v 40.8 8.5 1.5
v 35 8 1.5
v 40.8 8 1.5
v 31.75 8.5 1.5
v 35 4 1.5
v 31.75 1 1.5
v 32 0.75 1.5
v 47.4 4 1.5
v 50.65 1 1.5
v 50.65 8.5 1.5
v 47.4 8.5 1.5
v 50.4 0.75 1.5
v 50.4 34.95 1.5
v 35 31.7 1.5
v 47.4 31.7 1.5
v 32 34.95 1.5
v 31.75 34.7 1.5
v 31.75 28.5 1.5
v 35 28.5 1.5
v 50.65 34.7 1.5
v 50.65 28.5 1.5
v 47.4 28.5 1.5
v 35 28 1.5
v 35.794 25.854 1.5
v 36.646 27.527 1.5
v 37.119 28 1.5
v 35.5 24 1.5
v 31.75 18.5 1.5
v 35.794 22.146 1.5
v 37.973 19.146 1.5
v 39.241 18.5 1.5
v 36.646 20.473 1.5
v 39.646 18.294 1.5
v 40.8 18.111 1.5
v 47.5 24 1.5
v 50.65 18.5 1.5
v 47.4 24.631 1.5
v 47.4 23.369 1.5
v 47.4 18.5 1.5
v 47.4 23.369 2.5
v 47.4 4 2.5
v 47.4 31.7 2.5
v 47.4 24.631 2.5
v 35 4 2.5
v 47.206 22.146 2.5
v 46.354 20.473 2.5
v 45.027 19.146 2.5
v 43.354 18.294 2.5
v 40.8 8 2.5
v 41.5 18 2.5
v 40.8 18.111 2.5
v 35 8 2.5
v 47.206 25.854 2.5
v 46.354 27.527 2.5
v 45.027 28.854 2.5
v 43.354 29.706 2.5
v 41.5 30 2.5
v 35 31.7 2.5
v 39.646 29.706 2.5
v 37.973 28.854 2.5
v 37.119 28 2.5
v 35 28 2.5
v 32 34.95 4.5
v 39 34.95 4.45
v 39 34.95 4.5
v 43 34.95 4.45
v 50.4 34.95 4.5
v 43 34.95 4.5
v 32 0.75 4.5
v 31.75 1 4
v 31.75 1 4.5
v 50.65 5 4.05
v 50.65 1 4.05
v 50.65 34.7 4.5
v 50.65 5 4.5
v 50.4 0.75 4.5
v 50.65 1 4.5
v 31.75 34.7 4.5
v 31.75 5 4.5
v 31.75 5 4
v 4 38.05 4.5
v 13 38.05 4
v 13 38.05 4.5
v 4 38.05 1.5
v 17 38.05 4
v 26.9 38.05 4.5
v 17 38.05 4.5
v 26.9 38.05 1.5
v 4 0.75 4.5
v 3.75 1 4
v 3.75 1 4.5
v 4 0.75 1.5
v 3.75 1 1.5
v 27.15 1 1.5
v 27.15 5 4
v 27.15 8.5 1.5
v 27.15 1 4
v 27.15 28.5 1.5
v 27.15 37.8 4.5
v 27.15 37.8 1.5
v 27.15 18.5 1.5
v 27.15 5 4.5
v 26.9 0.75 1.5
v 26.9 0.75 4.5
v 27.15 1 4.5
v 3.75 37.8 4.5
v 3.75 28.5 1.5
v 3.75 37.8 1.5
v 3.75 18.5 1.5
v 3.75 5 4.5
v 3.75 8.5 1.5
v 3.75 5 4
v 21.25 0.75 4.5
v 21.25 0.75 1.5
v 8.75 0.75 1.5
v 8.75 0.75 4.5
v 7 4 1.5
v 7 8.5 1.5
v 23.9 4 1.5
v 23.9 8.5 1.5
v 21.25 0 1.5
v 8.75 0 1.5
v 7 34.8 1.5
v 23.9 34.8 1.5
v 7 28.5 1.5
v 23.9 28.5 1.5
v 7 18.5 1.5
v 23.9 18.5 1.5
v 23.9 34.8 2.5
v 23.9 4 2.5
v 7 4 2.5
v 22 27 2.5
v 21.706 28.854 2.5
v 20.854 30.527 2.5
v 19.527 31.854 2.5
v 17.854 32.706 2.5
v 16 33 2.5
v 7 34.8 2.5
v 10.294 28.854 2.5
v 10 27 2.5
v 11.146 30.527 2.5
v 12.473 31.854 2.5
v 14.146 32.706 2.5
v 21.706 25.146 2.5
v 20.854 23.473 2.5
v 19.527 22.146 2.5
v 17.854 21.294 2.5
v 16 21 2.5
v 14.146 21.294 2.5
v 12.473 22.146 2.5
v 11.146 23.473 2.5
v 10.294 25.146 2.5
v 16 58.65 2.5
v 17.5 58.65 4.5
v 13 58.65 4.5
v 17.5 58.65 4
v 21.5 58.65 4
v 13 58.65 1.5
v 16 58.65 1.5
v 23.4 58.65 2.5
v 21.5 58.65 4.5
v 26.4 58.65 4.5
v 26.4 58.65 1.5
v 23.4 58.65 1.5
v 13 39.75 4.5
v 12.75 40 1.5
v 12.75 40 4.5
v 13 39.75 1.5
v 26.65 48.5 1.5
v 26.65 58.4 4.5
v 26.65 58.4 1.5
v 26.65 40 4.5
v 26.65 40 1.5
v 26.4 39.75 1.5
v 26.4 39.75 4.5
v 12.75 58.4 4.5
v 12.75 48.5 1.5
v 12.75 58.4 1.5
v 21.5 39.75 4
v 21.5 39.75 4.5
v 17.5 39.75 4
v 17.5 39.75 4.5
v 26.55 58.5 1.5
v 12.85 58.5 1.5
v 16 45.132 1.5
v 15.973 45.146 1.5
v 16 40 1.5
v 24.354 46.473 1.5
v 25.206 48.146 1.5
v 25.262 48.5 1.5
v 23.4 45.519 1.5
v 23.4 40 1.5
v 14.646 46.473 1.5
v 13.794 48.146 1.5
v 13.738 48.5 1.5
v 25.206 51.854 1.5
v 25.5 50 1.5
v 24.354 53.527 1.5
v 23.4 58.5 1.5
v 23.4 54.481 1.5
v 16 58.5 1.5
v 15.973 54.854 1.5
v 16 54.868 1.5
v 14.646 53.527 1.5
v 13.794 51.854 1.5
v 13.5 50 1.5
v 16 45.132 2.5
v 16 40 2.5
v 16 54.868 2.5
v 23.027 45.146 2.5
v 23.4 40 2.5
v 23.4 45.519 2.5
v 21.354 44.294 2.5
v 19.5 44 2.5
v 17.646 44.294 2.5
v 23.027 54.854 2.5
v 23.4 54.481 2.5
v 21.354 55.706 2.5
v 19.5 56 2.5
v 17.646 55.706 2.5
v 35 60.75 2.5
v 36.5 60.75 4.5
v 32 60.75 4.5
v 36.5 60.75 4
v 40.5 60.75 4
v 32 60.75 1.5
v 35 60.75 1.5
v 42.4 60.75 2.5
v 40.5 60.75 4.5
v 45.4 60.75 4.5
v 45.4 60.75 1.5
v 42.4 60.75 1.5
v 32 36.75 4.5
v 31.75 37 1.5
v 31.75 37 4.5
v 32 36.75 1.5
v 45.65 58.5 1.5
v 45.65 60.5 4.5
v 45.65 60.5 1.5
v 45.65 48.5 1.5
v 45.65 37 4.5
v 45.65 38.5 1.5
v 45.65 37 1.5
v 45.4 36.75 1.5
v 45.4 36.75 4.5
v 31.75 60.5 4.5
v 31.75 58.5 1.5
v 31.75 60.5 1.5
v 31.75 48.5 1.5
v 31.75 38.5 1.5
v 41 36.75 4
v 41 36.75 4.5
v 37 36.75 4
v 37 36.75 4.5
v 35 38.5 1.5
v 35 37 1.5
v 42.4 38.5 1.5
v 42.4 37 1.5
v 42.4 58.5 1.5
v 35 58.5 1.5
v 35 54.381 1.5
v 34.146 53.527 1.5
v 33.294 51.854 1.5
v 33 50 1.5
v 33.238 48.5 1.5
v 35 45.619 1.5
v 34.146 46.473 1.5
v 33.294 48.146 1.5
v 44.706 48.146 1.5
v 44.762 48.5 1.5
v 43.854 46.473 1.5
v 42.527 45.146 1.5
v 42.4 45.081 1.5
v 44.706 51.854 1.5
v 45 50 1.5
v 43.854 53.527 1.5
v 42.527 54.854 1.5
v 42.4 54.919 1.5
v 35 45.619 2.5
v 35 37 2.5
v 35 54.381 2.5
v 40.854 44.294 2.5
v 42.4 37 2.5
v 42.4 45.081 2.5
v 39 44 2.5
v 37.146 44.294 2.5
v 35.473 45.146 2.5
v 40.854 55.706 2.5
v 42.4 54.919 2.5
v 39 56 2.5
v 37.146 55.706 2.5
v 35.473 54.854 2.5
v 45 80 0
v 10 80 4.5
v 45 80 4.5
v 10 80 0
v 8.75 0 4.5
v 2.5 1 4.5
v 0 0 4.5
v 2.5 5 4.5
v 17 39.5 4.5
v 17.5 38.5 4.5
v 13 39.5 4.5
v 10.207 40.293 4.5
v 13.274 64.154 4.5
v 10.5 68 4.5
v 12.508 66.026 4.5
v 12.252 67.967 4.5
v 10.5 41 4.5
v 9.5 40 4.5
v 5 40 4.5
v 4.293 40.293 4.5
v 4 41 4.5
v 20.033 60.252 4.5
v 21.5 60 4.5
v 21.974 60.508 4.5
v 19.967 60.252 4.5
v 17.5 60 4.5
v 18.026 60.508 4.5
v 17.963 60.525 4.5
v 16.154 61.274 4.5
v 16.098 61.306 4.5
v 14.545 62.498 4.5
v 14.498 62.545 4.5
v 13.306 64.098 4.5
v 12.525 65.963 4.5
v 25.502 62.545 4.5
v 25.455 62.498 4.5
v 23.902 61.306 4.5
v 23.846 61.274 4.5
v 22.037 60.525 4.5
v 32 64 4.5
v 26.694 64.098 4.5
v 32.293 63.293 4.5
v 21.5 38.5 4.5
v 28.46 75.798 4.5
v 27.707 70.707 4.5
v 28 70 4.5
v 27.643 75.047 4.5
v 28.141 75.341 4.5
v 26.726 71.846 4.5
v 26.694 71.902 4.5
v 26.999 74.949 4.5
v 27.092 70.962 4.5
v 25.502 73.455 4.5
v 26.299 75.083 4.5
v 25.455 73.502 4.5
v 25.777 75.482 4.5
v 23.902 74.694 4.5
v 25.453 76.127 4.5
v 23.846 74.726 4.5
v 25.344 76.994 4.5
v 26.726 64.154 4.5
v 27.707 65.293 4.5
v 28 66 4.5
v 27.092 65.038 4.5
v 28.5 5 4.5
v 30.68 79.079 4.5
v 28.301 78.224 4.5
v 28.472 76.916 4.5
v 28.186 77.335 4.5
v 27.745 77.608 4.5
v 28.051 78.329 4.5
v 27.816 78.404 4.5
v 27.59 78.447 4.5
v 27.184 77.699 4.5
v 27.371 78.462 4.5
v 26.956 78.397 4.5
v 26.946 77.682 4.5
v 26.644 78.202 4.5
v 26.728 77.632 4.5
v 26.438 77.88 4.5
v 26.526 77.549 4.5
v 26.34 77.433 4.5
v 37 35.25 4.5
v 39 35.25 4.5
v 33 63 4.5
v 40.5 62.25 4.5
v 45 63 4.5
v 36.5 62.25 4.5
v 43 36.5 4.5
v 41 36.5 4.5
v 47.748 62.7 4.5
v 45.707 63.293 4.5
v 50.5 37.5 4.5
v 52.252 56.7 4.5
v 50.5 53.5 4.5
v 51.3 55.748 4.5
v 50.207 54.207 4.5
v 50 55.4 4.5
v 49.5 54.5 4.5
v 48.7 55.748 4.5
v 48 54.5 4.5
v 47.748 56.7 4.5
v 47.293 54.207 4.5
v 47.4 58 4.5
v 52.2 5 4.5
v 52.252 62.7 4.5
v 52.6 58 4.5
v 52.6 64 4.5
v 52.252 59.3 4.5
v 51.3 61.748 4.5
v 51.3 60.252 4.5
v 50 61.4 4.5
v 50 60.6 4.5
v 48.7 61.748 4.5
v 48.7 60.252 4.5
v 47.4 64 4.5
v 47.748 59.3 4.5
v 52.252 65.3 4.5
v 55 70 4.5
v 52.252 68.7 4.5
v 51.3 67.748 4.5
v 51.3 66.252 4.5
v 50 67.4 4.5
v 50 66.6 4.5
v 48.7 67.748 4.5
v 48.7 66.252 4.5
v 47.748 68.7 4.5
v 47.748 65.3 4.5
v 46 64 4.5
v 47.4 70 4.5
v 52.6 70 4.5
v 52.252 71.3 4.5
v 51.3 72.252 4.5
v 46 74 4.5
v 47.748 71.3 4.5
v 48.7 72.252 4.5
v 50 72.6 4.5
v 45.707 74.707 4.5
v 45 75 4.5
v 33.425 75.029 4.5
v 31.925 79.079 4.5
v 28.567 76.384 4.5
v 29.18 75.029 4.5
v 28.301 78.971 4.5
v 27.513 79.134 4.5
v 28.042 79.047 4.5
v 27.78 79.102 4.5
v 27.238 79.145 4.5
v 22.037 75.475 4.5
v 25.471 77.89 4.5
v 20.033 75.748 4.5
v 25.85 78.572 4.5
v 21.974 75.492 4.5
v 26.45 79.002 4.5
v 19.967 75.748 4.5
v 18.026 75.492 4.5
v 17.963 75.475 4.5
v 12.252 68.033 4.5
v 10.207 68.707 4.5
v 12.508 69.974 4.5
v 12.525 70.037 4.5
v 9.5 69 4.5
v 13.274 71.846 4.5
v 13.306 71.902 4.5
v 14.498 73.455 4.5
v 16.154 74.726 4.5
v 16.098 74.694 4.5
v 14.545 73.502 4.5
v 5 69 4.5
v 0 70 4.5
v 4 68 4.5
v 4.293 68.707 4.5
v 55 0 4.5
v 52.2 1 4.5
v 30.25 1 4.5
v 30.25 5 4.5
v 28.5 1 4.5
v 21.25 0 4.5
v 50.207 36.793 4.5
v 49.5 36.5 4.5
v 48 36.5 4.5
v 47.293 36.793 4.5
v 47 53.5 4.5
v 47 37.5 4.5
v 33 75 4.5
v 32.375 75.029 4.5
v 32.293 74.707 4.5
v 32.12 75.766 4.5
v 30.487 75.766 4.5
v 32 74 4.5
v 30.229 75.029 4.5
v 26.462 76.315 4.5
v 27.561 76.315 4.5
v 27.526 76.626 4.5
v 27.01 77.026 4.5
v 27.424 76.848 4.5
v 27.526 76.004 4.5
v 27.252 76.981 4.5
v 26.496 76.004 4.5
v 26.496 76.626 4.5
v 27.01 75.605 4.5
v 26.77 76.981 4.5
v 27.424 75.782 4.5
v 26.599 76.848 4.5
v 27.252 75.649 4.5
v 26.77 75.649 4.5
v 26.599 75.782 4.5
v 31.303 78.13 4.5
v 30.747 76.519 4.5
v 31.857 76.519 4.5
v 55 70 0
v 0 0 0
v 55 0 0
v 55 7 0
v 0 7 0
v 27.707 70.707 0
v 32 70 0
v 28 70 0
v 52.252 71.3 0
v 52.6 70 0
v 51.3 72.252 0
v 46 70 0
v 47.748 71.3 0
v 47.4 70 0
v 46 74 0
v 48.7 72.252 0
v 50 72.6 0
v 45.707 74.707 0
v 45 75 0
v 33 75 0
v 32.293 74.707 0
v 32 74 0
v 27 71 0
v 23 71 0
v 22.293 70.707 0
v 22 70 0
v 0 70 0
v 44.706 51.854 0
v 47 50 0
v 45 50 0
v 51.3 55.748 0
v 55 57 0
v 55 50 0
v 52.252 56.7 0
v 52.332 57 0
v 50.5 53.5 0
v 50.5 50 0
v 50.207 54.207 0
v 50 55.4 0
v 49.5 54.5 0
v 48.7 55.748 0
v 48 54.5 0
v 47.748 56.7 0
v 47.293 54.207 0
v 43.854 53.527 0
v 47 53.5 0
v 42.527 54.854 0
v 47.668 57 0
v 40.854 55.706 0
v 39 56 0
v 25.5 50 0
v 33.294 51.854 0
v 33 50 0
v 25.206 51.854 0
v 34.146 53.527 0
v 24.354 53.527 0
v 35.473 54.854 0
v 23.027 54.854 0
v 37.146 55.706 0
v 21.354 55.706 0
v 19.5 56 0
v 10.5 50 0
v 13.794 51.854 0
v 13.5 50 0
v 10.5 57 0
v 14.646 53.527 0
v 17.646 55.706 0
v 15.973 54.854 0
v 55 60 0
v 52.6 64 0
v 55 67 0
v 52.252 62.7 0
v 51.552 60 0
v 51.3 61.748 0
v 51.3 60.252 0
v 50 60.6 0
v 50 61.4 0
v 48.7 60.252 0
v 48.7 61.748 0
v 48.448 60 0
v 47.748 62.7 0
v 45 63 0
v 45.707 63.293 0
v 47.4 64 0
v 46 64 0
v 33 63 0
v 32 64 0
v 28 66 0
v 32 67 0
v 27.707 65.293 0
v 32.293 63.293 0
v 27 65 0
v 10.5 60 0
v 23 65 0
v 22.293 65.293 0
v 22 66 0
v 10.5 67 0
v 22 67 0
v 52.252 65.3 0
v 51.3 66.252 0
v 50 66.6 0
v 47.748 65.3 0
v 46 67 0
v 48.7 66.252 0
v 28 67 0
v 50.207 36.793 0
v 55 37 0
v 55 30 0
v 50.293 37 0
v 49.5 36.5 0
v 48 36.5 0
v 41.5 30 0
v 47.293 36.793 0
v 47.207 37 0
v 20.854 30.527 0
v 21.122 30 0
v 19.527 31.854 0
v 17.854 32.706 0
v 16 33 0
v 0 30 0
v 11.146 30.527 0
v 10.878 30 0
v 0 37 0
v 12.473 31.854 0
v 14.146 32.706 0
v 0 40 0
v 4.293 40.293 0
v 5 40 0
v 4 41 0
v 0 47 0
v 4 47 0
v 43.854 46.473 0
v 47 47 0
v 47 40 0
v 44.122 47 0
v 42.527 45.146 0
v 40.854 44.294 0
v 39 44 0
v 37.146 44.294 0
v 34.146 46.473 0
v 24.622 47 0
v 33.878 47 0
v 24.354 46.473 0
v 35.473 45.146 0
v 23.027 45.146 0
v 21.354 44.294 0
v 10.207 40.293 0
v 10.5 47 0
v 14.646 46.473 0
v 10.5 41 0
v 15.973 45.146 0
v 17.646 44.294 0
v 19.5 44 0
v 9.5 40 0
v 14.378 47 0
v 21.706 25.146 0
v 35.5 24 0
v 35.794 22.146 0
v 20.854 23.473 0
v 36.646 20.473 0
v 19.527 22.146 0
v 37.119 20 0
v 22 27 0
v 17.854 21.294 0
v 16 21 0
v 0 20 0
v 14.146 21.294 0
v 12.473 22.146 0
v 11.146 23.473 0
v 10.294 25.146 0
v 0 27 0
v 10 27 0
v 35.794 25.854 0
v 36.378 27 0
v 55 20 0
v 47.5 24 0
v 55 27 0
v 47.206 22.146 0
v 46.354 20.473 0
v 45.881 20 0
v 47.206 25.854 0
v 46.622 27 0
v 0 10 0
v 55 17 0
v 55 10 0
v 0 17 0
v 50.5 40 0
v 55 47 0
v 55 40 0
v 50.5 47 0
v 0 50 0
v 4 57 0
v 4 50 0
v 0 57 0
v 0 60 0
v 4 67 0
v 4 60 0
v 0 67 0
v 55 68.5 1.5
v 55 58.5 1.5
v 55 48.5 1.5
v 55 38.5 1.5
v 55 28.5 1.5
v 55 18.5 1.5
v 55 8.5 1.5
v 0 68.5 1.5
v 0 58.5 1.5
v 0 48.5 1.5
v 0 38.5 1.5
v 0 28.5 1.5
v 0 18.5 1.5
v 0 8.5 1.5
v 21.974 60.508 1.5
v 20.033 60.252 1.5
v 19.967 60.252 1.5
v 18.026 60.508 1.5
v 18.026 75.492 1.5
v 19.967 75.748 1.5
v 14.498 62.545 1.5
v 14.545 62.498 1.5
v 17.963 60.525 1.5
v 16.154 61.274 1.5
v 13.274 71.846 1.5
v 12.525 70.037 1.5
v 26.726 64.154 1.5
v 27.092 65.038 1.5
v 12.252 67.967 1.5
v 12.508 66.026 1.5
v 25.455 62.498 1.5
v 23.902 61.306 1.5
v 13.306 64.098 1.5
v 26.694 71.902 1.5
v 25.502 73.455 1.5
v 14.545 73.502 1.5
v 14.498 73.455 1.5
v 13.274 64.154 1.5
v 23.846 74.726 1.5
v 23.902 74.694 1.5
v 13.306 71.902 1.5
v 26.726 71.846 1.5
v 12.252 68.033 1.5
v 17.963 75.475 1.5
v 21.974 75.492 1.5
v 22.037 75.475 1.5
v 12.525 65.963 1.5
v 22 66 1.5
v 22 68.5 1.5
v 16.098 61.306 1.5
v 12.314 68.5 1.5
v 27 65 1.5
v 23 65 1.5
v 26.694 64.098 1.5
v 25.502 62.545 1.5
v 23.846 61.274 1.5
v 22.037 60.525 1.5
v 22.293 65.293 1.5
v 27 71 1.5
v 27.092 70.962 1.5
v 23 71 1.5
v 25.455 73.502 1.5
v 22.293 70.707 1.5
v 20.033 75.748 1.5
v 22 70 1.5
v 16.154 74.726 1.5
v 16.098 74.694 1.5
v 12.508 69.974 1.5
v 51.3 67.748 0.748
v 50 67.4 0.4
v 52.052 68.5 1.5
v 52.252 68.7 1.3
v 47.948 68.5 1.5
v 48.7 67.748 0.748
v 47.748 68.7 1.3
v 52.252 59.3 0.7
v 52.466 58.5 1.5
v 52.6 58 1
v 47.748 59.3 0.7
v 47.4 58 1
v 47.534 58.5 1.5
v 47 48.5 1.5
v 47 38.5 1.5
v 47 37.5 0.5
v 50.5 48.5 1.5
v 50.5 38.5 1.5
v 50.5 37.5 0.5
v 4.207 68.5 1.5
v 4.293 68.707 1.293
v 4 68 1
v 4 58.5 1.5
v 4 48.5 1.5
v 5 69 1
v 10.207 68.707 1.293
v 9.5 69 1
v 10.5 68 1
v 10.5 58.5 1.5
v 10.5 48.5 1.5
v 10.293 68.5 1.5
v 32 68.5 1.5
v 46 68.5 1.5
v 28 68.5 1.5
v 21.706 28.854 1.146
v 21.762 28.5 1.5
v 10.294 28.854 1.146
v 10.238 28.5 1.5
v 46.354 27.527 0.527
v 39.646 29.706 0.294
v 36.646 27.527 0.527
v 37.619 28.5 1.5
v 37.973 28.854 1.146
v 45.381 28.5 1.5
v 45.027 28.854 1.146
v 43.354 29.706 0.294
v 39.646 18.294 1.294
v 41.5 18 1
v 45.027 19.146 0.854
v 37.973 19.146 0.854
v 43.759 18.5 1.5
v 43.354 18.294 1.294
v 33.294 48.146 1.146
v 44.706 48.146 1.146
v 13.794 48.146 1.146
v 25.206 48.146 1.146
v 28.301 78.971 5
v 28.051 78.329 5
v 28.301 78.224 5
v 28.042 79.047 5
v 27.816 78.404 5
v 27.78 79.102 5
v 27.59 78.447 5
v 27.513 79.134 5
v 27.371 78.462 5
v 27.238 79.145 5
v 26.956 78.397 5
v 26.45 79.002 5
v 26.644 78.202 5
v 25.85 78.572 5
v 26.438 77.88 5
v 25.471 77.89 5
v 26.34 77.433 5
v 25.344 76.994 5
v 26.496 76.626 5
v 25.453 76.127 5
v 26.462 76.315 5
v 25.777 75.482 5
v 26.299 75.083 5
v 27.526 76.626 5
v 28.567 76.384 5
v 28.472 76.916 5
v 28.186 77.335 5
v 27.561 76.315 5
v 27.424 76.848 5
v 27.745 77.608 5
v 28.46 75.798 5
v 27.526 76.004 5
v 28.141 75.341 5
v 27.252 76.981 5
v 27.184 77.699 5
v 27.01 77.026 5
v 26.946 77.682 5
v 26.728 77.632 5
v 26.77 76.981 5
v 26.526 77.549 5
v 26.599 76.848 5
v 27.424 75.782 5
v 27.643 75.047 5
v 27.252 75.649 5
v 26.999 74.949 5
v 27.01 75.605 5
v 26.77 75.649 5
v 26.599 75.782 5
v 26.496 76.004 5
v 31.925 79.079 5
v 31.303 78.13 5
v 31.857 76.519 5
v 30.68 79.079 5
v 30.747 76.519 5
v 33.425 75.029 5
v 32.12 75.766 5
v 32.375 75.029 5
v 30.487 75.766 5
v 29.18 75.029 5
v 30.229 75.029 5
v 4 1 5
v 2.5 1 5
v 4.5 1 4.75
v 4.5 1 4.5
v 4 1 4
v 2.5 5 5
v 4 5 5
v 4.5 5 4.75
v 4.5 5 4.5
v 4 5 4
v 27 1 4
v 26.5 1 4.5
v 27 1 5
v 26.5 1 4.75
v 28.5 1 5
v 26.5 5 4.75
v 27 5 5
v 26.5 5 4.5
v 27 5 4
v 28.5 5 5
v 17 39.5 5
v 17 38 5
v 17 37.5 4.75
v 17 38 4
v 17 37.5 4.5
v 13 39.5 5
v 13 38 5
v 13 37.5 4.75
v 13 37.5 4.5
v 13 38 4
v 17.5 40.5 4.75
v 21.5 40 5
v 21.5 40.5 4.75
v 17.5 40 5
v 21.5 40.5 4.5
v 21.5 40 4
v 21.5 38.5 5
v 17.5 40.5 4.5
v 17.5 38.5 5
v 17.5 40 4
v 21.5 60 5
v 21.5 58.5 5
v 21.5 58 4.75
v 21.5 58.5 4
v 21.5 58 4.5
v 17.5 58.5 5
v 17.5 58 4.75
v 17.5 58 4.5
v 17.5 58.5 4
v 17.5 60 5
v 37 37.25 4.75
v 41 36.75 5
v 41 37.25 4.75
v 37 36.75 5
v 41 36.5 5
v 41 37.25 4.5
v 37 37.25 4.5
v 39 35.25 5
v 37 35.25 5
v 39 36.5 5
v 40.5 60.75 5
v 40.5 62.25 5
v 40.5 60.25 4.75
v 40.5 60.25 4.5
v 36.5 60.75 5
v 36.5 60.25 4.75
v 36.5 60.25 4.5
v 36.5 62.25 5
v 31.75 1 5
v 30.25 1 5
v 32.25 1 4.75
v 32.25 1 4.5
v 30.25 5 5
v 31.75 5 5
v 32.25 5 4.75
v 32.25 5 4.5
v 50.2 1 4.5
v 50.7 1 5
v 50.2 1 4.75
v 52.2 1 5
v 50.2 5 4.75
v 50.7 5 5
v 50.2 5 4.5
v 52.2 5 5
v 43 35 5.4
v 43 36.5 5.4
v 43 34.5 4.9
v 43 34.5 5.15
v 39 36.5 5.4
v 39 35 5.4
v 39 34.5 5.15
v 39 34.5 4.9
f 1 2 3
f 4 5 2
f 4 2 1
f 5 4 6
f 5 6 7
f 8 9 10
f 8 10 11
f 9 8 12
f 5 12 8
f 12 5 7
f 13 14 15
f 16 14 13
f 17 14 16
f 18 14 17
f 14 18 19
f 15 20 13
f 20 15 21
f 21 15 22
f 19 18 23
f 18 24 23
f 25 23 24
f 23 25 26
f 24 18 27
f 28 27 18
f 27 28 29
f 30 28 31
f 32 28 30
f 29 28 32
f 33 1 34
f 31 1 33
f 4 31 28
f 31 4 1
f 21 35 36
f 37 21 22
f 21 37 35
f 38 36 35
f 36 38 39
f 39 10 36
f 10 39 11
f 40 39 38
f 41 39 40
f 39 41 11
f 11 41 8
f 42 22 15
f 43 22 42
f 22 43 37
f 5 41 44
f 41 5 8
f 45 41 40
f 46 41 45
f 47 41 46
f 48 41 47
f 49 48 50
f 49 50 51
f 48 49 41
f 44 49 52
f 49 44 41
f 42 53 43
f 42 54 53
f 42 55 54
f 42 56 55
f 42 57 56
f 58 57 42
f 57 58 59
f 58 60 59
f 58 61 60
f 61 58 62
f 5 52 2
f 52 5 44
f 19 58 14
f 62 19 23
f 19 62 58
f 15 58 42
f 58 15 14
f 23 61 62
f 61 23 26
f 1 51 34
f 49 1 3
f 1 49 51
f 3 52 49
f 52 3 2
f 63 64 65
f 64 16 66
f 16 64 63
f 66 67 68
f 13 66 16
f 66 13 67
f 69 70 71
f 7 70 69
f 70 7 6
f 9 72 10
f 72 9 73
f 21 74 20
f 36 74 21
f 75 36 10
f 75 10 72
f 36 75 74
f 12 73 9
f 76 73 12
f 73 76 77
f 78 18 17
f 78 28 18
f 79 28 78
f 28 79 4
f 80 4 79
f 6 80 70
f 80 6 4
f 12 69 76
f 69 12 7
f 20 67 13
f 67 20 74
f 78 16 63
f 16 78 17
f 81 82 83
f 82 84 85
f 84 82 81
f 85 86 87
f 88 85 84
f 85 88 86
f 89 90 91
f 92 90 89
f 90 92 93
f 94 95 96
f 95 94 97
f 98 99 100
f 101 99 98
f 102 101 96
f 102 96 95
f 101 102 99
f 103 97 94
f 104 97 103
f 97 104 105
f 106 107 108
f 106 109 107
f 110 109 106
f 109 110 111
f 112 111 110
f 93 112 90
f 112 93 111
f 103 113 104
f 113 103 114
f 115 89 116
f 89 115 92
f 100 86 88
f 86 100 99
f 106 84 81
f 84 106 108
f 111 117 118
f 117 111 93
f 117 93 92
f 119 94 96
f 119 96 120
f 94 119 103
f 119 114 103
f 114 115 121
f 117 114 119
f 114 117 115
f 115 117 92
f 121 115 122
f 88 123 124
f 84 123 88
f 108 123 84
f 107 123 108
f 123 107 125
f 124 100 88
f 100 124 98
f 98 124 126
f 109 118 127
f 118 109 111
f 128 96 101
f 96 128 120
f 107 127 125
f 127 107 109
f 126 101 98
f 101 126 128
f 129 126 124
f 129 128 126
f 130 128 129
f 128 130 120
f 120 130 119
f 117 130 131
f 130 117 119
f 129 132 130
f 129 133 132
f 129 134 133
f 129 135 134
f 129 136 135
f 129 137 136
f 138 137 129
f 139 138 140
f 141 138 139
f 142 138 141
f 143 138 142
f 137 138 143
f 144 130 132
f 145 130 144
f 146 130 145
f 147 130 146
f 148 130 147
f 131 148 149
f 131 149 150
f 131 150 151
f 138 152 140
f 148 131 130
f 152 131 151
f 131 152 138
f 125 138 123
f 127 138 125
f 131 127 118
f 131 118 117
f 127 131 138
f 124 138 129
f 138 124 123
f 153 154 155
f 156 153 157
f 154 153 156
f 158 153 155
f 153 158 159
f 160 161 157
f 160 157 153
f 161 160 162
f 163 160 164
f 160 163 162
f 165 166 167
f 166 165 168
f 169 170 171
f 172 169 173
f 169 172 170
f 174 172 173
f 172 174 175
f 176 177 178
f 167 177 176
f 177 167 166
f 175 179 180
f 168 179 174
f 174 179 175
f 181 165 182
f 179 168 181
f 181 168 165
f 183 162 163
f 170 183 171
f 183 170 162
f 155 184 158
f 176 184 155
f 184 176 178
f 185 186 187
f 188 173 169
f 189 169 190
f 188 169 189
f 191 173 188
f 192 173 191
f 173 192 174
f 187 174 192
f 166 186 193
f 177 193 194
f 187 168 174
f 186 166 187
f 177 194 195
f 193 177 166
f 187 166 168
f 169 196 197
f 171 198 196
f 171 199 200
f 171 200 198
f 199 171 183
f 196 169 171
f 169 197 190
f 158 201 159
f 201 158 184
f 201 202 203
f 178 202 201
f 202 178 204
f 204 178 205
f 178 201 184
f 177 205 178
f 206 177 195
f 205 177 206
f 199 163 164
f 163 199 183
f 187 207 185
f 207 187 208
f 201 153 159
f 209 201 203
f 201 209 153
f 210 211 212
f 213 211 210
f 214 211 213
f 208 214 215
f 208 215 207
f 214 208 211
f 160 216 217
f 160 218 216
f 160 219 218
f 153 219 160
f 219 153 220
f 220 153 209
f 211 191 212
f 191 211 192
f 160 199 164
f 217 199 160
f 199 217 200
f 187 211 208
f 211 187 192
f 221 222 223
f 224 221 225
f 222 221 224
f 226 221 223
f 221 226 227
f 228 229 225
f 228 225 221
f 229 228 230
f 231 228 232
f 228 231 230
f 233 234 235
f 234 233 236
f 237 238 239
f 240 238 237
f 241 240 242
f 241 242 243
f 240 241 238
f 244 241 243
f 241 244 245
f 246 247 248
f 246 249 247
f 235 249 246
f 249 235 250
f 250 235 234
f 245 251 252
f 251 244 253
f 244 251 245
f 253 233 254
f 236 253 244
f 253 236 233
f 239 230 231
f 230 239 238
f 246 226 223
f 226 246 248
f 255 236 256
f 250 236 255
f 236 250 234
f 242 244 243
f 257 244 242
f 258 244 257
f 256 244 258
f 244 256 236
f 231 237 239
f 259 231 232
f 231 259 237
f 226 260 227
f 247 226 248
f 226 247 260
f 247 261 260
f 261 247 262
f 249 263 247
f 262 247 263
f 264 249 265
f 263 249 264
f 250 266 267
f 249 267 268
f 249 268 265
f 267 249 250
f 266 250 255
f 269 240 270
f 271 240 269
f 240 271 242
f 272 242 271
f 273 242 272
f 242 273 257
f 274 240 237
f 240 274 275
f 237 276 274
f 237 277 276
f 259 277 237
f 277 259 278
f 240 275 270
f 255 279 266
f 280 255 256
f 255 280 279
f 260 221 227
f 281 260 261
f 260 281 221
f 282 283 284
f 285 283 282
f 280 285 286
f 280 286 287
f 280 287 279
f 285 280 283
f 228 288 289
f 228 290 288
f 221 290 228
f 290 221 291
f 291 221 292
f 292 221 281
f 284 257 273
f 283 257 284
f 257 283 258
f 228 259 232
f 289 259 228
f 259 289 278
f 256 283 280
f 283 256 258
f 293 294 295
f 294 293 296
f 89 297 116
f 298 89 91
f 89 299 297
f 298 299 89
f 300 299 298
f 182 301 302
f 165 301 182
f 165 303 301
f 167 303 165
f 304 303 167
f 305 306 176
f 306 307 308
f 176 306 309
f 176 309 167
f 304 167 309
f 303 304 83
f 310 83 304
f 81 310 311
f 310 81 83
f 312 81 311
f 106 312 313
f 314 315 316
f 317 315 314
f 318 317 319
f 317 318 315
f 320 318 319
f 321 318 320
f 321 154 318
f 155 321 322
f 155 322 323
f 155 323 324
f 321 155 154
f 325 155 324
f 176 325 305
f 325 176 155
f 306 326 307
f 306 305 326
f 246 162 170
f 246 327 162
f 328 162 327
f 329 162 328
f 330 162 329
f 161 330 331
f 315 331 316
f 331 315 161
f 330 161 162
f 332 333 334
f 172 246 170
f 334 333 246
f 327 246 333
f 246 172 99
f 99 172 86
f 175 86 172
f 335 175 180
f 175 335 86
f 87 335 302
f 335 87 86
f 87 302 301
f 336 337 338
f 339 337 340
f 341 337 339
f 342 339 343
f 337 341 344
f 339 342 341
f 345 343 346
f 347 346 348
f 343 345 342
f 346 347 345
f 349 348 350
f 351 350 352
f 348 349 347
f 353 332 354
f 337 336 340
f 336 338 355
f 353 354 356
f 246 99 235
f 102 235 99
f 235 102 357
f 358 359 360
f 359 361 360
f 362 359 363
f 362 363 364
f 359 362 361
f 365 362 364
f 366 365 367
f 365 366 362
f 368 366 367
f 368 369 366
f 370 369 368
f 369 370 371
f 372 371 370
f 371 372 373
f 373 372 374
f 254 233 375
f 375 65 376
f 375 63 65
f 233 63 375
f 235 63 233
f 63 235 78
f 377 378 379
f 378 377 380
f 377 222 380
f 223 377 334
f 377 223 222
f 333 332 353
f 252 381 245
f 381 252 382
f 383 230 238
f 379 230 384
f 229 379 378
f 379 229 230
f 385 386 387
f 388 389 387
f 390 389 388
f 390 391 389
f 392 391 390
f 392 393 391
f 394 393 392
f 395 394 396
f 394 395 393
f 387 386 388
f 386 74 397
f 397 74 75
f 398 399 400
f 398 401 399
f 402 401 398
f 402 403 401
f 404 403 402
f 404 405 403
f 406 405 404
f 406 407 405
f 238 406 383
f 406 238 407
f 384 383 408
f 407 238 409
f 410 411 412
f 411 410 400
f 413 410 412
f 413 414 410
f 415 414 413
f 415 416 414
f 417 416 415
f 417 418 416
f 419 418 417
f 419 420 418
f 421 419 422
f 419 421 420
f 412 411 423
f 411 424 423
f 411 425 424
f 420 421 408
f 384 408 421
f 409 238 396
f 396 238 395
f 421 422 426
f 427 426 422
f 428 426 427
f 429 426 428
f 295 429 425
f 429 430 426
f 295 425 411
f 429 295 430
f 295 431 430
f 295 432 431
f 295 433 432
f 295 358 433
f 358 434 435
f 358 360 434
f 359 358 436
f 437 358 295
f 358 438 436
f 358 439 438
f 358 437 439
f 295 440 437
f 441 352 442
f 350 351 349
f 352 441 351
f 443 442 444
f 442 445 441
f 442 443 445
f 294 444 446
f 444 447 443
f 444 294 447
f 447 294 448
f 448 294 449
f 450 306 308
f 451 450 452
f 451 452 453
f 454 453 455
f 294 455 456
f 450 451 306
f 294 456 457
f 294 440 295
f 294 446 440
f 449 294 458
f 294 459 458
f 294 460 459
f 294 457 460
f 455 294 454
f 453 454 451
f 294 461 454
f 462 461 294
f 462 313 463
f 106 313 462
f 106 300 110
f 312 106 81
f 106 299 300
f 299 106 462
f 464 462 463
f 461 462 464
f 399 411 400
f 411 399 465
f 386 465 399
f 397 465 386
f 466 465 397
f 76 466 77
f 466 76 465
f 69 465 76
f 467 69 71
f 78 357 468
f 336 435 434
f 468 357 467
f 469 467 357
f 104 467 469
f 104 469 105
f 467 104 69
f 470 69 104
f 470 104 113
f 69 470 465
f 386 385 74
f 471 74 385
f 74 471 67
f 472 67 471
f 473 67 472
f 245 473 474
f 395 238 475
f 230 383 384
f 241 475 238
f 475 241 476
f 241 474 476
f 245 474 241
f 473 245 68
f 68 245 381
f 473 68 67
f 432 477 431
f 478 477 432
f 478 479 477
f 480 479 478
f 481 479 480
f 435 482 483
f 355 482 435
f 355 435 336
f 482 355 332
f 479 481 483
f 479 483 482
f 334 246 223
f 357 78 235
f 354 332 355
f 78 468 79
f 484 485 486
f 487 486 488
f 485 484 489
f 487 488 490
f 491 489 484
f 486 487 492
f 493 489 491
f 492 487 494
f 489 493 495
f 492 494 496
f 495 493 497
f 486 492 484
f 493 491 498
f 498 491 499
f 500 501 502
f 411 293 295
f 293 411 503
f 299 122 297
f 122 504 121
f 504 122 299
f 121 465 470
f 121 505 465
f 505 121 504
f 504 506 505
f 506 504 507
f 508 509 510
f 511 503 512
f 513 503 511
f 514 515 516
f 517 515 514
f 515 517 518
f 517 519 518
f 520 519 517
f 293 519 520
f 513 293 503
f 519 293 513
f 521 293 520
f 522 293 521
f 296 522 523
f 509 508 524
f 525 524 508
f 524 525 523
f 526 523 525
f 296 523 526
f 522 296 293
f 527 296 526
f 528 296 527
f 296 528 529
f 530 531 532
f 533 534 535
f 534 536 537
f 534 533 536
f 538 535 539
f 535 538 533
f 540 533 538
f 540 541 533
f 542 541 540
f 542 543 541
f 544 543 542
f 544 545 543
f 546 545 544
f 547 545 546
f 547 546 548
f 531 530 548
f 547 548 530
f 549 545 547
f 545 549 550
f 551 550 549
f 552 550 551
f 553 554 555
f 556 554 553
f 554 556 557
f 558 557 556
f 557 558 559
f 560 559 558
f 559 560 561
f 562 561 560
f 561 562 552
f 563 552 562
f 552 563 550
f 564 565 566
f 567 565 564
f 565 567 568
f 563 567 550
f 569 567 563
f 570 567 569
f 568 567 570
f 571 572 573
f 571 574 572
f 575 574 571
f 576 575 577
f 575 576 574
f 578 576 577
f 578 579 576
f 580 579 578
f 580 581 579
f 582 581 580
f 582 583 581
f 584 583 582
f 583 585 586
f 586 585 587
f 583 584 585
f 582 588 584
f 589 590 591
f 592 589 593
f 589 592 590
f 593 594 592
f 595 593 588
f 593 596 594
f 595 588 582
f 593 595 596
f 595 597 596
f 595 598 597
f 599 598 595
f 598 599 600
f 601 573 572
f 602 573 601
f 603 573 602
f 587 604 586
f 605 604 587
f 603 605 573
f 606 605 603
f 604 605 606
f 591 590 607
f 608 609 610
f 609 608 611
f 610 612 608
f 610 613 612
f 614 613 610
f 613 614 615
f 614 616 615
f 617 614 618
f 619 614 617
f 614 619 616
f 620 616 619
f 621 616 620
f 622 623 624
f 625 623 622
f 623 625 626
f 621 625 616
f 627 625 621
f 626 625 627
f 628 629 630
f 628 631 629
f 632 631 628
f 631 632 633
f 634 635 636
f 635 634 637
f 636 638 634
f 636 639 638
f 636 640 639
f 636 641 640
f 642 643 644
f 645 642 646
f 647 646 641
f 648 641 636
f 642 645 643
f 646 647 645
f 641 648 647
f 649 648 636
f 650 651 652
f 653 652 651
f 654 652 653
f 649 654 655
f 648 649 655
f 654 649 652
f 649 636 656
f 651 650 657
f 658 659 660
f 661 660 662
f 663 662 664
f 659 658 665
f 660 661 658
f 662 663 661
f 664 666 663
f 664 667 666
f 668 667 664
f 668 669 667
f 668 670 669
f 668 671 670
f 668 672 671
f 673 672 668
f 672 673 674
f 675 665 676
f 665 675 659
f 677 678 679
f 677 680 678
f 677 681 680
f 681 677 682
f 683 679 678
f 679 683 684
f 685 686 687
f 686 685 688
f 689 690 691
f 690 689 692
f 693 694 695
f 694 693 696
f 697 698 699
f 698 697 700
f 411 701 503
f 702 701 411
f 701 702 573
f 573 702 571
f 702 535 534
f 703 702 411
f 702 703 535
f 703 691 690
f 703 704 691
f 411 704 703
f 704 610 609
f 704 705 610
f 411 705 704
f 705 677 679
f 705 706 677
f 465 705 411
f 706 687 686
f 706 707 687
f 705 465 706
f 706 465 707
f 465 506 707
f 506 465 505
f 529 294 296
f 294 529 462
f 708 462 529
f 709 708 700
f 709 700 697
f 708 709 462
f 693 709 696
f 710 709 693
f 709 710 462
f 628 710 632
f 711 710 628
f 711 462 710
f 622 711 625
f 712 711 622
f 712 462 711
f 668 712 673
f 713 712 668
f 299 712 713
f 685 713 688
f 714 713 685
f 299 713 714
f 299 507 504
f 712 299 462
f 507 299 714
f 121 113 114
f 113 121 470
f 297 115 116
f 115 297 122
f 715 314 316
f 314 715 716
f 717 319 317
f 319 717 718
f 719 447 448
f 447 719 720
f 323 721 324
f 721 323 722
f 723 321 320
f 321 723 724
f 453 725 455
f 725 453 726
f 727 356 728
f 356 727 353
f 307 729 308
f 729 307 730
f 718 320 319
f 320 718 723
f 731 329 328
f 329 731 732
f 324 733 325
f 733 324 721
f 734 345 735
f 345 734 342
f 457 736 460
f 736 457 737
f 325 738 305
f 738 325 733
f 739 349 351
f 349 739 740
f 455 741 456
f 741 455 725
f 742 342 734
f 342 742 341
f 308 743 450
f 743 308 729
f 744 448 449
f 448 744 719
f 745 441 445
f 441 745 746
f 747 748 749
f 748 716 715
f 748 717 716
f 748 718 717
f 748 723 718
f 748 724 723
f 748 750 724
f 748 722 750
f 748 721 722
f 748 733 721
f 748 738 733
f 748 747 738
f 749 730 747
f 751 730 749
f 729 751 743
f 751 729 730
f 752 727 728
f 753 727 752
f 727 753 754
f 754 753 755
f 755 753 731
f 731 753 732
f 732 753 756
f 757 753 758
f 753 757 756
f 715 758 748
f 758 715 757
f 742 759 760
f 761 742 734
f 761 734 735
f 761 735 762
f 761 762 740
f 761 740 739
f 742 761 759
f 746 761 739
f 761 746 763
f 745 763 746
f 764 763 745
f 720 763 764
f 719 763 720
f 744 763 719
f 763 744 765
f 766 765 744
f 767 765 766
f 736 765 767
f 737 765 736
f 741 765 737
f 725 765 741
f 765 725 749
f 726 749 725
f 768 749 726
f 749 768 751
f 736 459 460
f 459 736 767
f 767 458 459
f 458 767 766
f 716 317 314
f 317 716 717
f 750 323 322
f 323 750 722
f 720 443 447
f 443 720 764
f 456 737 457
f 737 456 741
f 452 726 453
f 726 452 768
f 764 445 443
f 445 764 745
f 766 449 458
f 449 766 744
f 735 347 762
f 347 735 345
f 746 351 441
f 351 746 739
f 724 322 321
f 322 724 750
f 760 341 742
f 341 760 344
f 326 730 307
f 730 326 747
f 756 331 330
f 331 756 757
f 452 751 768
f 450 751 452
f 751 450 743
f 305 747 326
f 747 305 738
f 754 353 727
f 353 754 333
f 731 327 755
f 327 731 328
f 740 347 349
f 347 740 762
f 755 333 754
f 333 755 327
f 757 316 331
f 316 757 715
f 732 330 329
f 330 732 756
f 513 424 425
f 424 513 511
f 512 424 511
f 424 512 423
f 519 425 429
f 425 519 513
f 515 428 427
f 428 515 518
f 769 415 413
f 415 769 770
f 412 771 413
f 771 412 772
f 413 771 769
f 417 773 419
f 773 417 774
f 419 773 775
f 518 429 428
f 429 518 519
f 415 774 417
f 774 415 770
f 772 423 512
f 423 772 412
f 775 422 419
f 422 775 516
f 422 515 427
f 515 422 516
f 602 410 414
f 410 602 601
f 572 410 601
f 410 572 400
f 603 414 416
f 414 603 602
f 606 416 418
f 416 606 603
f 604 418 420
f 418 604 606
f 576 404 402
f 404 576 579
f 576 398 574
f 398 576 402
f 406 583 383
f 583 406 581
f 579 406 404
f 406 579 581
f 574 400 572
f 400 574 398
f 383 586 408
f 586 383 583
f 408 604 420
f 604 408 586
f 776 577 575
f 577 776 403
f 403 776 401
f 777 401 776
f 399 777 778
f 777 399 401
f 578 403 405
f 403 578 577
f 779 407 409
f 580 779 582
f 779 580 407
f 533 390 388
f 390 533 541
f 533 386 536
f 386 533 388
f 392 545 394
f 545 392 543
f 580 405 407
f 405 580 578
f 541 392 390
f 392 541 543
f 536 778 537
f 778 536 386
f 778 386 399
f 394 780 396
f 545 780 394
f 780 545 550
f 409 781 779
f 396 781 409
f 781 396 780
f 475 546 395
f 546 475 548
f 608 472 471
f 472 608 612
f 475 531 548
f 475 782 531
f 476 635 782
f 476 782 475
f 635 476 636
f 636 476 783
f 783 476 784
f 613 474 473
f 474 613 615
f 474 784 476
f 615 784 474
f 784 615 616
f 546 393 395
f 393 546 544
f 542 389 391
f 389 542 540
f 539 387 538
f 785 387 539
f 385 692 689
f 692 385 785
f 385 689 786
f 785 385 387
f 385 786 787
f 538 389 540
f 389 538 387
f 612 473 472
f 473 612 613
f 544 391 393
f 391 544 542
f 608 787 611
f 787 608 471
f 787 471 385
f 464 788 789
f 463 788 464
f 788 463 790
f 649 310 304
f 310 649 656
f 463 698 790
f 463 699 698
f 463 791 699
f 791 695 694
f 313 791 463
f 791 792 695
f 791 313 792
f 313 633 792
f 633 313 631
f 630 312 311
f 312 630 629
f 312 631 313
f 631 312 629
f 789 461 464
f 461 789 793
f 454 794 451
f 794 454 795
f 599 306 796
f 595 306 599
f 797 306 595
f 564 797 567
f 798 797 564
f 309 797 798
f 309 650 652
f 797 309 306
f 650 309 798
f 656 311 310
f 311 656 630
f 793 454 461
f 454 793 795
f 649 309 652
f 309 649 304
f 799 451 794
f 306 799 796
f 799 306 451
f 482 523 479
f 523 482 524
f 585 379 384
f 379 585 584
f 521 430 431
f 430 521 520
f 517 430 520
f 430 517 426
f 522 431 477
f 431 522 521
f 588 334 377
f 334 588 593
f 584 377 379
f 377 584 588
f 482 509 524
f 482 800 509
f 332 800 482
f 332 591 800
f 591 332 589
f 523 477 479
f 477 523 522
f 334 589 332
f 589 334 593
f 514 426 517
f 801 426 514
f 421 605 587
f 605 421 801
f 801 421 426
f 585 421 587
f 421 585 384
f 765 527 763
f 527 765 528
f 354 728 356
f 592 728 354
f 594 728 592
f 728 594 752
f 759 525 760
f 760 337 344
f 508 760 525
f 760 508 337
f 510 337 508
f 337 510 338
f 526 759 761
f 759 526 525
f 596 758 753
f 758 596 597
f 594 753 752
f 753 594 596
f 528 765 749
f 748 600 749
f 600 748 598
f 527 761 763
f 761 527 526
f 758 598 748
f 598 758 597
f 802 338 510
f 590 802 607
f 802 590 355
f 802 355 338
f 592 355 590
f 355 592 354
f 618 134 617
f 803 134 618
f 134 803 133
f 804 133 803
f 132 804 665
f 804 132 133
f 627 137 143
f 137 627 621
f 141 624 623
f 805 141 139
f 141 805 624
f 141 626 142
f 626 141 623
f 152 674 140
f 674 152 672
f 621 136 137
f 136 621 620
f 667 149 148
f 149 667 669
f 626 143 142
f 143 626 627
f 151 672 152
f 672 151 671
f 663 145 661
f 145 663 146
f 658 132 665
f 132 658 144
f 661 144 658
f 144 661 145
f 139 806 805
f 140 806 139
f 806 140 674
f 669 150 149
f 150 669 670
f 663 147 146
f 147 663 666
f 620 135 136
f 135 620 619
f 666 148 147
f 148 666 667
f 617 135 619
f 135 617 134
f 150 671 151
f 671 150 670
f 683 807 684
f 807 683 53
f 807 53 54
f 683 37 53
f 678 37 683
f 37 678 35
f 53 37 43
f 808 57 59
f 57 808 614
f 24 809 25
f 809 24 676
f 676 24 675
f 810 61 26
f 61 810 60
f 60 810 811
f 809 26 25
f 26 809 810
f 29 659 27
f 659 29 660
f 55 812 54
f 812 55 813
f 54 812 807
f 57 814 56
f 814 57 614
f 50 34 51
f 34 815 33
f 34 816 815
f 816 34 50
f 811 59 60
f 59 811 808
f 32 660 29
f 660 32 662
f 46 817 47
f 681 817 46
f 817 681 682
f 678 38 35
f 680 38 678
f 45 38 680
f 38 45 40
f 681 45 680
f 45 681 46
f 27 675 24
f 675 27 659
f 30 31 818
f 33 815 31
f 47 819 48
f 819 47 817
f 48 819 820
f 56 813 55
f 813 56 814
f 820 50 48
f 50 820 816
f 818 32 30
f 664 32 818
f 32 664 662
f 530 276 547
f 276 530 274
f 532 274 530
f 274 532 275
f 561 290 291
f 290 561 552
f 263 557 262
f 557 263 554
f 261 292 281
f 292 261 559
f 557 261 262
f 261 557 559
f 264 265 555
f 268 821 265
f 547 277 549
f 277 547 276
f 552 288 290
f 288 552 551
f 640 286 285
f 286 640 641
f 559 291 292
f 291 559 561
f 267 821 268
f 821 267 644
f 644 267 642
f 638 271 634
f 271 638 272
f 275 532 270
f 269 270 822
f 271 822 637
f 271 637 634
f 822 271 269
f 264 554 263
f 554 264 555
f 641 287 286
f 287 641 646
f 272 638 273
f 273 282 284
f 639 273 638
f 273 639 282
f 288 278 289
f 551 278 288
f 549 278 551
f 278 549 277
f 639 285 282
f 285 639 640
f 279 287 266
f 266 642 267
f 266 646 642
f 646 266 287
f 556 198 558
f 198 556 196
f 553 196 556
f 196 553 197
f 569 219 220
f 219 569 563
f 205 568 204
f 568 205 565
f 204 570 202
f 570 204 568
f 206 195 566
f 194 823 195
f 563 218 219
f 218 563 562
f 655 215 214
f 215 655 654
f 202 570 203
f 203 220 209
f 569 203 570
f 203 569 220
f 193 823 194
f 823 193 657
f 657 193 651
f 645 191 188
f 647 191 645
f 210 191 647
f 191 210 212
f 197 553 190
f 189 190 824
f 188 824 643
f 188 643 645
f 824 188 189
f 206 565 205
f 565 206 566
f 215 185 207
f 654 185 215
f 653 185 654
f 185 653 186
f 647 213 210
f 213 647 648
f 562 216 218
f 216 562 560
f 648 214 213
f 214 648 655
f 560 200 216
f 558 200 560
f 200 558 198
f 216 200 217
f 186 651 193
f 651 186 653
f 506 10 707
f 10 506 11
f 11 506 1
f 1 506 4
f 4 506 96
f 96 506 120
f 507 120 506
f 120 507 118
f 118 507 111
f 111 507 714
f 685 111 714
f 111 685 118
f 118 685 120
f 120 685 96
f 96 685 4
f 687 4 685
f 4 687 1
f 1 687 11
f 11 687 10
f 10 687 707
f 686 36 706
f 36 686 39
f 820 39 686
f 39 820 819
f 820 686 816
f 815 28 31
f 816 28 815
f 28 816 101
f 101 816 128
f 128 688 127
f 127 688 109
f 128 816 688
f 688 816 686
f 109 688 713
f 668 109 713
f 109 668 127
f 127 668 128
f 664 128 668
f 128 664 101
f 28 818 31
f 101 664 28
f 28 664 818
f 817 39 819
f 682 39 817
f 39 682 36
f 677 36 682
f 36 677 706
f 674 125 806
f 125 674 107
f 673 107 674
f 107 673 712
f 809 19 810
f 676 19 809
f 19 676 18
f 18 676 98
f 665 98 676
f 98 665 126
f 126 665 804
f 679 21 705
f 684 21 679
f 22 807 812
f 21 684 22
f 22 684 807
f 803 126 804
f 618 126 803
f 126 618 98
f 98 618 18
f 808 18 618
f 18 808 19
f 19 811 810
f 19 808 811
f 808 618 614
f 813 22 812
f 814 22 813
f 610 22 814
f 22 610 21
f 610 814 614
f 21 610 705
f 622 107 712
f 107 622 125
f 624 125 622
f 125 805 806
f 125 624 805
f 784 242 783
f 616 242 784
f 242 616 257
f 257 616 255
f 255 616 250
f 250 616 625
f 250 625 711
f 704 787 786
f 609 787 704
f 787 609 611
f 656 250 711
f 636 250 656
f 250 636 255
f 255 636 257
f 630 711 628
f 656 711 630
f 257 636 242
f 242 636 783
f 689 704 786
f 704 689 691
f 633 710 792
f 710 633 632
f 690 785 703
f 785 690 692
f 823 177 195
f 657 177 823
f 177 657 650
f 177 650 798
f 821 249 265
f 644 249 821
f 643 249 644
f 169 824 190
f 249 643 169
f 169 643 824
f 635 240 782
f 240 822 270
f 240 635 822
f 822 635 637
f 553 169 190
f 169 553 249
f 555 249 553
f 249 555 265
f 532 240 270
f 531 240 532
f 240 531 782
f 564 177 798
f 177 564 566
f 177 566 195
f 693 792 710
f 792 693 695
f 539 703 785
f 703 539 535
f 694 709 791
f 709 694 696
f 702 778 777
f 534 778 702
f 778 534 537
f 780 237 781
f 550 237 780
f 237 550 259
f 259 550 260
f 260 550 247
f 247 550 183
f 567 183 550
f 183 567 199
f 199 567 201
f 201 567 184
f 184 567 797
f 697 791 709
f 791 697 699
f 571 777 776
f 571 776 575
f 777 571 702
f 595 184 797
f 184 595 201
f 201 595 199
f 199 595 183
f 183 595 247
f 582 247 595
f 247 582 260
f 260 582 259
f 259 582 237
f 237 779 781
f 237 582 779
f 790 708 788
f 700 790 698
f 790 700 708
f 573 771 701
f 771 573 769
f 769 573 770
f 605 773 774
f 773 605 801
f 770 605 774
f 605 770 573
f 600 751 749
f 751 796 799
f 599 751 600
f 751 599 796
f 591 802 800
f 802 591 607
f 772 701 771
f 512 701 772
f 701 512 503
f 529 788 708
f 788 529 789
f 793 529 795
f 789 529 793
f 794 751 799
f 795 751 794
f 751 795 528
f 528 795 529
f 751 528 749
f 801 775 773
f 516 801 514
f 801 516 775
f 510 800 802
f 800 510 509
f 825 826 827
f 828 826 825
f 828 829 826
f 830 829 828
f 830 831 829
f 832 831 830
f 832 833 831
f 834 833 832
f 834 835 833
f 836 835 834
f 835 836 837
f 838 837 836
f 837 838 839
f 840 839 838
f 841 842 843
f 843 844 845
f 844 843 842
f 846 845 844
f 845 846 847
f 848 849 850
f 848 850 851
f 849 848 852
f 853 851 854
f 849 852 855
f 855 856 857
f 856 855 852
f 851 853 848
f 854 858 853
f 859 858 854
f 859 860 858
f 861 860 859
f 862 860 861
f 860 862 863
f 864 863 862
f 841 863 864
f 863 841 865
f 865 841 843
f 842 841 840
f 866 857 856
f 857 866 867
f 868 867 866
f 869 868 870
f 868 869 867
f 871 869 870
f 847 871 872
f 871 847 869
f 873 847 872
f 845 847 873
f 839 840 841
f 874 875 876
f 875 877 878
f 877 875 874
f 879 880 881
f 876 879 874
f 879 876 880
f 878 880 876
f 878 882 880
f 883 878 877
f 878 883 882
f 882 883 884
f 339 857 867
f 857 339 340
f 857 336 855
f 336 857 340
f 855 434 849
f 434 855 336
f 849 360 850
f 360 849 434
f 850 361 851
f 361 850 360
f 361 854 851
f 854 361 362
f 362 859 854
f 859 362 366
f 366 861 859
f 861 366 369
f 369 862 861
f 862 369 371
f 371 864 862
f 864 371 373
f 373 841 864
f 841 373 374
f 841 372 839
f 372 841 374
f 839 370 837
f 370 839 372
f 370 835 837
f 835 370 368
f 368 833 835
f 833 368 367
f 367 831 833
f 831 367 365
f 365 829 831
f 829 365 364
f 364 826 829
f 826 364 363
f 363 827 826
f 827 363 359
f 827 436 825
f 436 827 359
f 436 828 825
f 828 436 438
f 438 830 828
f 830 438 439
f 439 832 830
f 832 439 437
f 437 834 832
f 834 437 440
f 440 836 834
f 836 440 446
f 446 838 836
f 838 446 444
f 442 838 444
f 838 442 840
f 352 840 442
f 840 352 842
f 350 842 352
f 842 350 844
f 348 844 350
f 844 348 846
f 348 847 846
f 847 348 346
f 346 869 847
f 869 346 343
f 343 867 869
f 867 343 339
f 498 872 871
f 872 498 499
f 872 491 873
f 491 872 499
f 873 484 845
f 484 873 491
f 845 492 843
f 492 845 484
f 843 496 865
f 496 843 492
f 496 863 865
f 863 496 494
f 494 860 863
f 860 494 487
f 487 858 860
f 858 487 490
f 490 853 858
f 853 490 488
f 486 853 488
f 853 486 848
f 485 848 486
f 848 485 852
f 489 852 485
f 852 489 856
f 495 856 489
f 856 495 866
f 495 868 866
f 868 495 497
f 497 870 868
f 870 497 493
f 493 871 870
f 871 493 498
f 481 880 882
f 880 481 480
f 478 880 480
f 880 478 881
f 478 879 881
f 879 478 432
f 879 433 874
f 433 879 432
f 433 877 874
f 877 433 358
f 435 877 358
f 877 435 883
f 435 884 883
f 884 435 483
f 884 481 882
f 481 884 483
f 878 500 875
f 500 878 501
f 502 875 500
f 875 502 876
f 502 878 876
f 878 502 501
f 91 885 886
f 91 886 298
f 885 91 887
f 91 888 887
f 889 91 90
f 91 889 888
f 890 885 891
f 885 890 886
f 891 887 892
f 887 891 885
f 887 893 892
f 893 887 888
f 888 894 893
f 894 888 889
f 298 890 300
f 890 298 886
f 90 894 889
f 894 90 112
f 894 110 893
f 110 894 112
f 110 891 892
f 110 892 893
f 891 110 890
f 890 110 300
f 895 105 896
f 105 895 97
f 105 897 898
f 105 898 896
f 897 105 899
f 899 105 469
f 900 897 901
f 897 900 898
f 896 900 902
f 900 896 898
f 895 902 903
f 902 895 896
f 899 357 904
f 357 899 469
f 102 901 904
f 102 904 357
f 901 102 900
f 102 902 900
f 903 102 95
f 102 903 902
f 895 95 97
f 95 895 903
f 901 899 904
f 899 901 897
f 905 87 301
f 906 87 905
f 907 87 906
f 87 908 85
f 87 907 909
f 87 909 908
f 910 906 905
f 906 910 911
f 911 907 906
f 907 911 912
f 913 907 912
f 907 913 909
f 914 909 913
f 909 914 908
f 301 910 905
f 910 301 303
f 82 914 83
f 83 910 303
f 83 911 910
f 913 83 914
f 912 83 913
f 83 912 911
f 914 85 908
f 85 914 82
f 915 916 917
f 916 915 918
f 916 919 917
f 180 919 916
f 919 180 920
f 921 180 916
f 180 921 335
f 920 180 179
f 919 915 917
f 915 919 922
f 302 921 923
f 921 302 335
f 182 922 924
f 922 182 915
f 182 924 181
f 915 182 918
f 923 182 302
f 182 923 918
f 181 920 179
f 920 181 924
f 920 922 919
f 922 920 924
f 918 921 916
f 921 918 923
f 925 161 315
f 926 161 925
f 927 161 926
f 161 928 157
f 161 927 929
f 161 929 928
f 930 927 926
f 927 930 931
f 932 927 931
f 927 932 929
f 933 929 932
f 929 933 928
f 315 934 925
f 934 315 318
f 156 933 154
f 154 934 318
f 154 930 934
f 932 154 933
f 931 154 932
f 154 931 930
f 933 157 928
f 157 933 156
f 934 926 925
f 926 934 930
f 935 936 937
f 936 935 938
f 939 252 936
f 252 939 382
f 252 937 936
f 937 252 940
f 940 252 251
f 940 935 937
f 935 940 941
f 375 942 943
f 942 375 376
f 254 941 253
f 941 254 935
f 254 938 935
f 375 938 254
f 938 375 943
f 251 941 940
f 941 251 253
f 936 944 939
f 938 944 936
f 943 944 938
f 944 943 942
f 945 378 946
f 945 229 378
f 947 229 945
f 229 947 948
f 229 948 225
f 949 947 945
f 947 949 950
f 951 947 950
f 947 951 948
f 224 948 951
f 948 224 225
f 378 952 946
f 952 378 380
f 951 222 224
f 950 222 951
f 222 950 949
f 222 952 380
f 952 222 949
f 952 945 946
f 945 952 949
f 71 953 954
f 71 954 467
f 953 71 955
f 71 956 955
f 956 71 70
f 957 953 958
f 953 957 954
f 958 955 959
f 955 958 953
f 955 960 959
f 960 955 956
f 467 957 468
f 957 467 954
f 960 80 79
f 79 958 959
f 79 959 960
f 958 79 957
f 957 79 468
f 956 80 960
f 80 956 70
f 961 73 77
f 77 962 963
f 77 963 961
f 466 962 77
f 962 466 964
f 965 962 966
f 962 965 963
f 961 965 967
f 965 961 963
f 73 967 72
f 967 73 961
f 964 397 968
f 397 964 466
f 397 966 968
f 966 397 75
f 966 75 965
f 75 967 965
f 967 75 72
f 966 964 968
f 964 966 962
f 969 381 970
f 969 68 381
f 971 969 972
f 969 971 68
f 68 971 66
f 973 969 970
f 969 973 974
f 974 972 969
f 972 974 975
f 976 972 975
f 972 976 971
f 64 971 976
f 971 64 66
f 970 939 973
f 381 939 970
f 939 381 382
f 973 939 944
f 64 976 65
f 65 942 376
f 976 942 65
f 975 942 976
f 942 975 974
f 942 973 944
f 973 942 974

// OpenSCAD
tol=0.25;
extra=4;


difference(){   // cut the board and components out of 
    // the base plate #1
    
// Base 1 plate
B1p=[ [0,0], [55,0], [55,70], [45,80],
[10,80], [0,70] ];
translate([0,0,0]) color("gray")
linear_extrude(height=4.5)
polygon(points=B1p);

//union(){
// Pro Mini
translate([32,1,1.5]) color("red"){
    difference(){
        linear_extrude(height=0.86+extra) 
        offset(r=tol) square(size=[18.4, 33.7]);

        difference(){
        linear_extrude(height=1) 
        offset(r=-3) square(size=[18.4, 33.7]);

        linear_extrude(height=1) 
        translate([2.8,7,0]) square(size=[6,20]);
        }

    }
}

// Adafruit PowerBoost 1000c
translate([4,1,1.5]) color("blue"){
    difference(){
        linear_extrude(height=1.7+extra) 
        offset(r=tol) square(size=[22.9, 36.8]);

        linear_extrude(height=1) 
        offset(r=-3) square(size=[22.9, 36.8]);
    }
}
// notch for the USB charger cable
translate([9,0,1.5]) color("pink"){
    linear_extrude(height=1.7+extra) 
        offset(r=tol) square(size=[12, 2]);
}

// TXB0104 Level Shifter
translate([13,40,1.5]) color("green") {
    difference(){
        linear_extrude(height=1.7+extra) 
        offset(r=tol) square(size=[13.4, 18.4]);
            
        linear_extrude(height=1) 
        translate([3,0,0]) square(size=[7.4, 22]);
    }
}

// LIS3DH
translate([32,37,1.5]) color("yellow") {
    difference(){
        linear_extrude(height=1.7+extra) 
        offset(r=tol) square(size=[13.4, 23.5]);
            
        linear_extrude(height=1) 
        translate([3,0,0]) square(size=[7.4, 26]);
    } 
}

// Piezo
translate([20,68,1.5]) color("orange") {
    linear_extrude(height=1.4+extra) 
    offset(r=tol)
     circle(r=7.5);
}
/*
// centerline holes
for(i=[0:1:13]){
translate([29.4,8+i*4,-2]) color("red") {
cylinder(h=8,r=1.5,$fn=12);
}
}
// leftline holes
for(i=[0:1:20]){
translate([2,8+i*3,-2]) color("red") {
cylinder(h=8,r=1.0,$fn=12);
}
}

// rightline holes
for(i=[0:1:15]){
translate([52.5,8+i*3,-2]) color("red") {
cylinder(h=8,r=1.0,$fn=12);
}
}
*/
// Led holes
translate([50,70,-2]) color("red") {
cylinder(h=8,r=2.6,$fn=12);
}
translate([50,64,-2]) color("yellow") {
cylinder(h=8,r=2.6,$fn=12);
}
translate([50,58,-2]) color("green") {
cylinder(h=8,r=2.6,$fn=12);
}

// Wire Pass-thru also lightweighting
translate([48,37.5,-2]) color("black") {
    linear_extrude(height=12) 
    offset(r=1,$fn=8) square(size=[1.5,16]);
}
translate([5,41,-2]) color("black") {
    linear_extrude(height=12) 
    offset(r=1, $fn=8) square(size=[4.5,27]);
}
translate([33,64,-2]) color("black") {
    linear_extrude(height=12) 
    offset(r=1,$fn=8) square(size=[12,10]);
}
translate([23,66,-2]) color("black") {
    linear_extrude(height=12) 
    offset(r=1,$fn=8) square(size=[4,4]);
}

// Popouts for the boards
translate([16,27,-2]) color("cyan") {
cylinder(h=12,r=6,$fn=20);
}
translate([41.5,24,-2]) color("cyan") {
cylinder(h=12,r=6,$fn=20);
}
translate([39,50,-2]) color("cyan") {
cylinder(h=12,r=6,$fn=20);
}
translate([19.5,50,-2]) color("cyan") {
cylinder(h=12,r=6,$fn=20);
}


// stress relief
pr1=[ [0,0], [-1.5,-1.5], [0,-3] ];
translate([0,10,0]) color("cyan") 
    rotate([0,90,0]) linear_extrude(height=55) polygon(points=pr1);
translate([0,20,0]) color("cyan") 
    rotate([0,90,0]) linear_extrude(height=55) polygon(points=pr1);
translate([0,30,0]) color("cyan") 
    rotate([0,90,0]) linear_extrude(height=55) polygon(points=pr1);
translate([0,40,0]) color("cyan") 
    rotate([0,90,0]) linear_extrude(height=55) polygon(points=pr1);
translate([0,50,0]) color("cyan") 
    rotate([0,90,0]) linear_extrude(height=55) polygon(points=pr1);
translate([0,60,0]) color("cyan") 
    rotate([0,90,0]) linear_extrude(height=55) polygon(points=pr1);
translate([0,70,0]) color("cyan") 
    rotate([0,90,0]) linear_extrude(height=55) polygon(points=pr1);



} // end of diffence

// add text
translate ([25,77,3.5]) color("red") 
    linear_extrude(height=1.5){
    text("6A", font = "Open Sans:style=Bold", size=4,halign="left",valign="center",spacing=1.1);
    }



pt1=[ [0,0], [0.5,0.5], [0.5,0.75], [0,1], [-1.5,1], [-1.5,0] ];
// retainer tabs blue
translate([4,5,4]) color("orange") {
    rotate([90,0,0]) linear_extrude(height=4) polygon(points=pt1);
}
translate([27,1,4]) color("orange") {
    rotate([90,0,180]) linear_extrude(height=4) polygon(points=pt1);
}
translate([17,38,4]) color("orange") {
    rotate([90,0,-90]) linear_extrude(height=4) polygon(points=pt1);
}
    
// retainer tabs green
translate([17.5,40,4]) color("orange") {
    rotate([90,0,90]) linear_extrude(height=4) polygon(points=pt1);
}
translate([21.5,58.5,4]) color("orange") {
    rotate([90,0,-90]) linear_extrude(height=4) polygon(points=pt1);
}

// retainer tabs yellow
translate([37,36.75,4]) color("orange") {
    rotate([90,0,90]) linear_extrude(height=4) polygon(points=pt1);
}
translate([40.5,60.75,4]) color("orange") {
    rotate([90,0,-90]) linear_extrude(height=4) polygon(points=pt1);
}

// retainer tabs red
translate([31.75,5,4]) color("orange") {
    rotate([90,0,0]) linear_extrude(height=4) polygon(points=pt1);
}
translate([50.7,1,4]) color("orange") {
    rotate([90,0,180]) linear_extrude(height=4) polygon(points=pt1);
}
translate([43,35,4.4]) color("orange") {
    rotate([90,0,-90]) linear_extrude(height=4) polygon(points=pt1);
}
    
